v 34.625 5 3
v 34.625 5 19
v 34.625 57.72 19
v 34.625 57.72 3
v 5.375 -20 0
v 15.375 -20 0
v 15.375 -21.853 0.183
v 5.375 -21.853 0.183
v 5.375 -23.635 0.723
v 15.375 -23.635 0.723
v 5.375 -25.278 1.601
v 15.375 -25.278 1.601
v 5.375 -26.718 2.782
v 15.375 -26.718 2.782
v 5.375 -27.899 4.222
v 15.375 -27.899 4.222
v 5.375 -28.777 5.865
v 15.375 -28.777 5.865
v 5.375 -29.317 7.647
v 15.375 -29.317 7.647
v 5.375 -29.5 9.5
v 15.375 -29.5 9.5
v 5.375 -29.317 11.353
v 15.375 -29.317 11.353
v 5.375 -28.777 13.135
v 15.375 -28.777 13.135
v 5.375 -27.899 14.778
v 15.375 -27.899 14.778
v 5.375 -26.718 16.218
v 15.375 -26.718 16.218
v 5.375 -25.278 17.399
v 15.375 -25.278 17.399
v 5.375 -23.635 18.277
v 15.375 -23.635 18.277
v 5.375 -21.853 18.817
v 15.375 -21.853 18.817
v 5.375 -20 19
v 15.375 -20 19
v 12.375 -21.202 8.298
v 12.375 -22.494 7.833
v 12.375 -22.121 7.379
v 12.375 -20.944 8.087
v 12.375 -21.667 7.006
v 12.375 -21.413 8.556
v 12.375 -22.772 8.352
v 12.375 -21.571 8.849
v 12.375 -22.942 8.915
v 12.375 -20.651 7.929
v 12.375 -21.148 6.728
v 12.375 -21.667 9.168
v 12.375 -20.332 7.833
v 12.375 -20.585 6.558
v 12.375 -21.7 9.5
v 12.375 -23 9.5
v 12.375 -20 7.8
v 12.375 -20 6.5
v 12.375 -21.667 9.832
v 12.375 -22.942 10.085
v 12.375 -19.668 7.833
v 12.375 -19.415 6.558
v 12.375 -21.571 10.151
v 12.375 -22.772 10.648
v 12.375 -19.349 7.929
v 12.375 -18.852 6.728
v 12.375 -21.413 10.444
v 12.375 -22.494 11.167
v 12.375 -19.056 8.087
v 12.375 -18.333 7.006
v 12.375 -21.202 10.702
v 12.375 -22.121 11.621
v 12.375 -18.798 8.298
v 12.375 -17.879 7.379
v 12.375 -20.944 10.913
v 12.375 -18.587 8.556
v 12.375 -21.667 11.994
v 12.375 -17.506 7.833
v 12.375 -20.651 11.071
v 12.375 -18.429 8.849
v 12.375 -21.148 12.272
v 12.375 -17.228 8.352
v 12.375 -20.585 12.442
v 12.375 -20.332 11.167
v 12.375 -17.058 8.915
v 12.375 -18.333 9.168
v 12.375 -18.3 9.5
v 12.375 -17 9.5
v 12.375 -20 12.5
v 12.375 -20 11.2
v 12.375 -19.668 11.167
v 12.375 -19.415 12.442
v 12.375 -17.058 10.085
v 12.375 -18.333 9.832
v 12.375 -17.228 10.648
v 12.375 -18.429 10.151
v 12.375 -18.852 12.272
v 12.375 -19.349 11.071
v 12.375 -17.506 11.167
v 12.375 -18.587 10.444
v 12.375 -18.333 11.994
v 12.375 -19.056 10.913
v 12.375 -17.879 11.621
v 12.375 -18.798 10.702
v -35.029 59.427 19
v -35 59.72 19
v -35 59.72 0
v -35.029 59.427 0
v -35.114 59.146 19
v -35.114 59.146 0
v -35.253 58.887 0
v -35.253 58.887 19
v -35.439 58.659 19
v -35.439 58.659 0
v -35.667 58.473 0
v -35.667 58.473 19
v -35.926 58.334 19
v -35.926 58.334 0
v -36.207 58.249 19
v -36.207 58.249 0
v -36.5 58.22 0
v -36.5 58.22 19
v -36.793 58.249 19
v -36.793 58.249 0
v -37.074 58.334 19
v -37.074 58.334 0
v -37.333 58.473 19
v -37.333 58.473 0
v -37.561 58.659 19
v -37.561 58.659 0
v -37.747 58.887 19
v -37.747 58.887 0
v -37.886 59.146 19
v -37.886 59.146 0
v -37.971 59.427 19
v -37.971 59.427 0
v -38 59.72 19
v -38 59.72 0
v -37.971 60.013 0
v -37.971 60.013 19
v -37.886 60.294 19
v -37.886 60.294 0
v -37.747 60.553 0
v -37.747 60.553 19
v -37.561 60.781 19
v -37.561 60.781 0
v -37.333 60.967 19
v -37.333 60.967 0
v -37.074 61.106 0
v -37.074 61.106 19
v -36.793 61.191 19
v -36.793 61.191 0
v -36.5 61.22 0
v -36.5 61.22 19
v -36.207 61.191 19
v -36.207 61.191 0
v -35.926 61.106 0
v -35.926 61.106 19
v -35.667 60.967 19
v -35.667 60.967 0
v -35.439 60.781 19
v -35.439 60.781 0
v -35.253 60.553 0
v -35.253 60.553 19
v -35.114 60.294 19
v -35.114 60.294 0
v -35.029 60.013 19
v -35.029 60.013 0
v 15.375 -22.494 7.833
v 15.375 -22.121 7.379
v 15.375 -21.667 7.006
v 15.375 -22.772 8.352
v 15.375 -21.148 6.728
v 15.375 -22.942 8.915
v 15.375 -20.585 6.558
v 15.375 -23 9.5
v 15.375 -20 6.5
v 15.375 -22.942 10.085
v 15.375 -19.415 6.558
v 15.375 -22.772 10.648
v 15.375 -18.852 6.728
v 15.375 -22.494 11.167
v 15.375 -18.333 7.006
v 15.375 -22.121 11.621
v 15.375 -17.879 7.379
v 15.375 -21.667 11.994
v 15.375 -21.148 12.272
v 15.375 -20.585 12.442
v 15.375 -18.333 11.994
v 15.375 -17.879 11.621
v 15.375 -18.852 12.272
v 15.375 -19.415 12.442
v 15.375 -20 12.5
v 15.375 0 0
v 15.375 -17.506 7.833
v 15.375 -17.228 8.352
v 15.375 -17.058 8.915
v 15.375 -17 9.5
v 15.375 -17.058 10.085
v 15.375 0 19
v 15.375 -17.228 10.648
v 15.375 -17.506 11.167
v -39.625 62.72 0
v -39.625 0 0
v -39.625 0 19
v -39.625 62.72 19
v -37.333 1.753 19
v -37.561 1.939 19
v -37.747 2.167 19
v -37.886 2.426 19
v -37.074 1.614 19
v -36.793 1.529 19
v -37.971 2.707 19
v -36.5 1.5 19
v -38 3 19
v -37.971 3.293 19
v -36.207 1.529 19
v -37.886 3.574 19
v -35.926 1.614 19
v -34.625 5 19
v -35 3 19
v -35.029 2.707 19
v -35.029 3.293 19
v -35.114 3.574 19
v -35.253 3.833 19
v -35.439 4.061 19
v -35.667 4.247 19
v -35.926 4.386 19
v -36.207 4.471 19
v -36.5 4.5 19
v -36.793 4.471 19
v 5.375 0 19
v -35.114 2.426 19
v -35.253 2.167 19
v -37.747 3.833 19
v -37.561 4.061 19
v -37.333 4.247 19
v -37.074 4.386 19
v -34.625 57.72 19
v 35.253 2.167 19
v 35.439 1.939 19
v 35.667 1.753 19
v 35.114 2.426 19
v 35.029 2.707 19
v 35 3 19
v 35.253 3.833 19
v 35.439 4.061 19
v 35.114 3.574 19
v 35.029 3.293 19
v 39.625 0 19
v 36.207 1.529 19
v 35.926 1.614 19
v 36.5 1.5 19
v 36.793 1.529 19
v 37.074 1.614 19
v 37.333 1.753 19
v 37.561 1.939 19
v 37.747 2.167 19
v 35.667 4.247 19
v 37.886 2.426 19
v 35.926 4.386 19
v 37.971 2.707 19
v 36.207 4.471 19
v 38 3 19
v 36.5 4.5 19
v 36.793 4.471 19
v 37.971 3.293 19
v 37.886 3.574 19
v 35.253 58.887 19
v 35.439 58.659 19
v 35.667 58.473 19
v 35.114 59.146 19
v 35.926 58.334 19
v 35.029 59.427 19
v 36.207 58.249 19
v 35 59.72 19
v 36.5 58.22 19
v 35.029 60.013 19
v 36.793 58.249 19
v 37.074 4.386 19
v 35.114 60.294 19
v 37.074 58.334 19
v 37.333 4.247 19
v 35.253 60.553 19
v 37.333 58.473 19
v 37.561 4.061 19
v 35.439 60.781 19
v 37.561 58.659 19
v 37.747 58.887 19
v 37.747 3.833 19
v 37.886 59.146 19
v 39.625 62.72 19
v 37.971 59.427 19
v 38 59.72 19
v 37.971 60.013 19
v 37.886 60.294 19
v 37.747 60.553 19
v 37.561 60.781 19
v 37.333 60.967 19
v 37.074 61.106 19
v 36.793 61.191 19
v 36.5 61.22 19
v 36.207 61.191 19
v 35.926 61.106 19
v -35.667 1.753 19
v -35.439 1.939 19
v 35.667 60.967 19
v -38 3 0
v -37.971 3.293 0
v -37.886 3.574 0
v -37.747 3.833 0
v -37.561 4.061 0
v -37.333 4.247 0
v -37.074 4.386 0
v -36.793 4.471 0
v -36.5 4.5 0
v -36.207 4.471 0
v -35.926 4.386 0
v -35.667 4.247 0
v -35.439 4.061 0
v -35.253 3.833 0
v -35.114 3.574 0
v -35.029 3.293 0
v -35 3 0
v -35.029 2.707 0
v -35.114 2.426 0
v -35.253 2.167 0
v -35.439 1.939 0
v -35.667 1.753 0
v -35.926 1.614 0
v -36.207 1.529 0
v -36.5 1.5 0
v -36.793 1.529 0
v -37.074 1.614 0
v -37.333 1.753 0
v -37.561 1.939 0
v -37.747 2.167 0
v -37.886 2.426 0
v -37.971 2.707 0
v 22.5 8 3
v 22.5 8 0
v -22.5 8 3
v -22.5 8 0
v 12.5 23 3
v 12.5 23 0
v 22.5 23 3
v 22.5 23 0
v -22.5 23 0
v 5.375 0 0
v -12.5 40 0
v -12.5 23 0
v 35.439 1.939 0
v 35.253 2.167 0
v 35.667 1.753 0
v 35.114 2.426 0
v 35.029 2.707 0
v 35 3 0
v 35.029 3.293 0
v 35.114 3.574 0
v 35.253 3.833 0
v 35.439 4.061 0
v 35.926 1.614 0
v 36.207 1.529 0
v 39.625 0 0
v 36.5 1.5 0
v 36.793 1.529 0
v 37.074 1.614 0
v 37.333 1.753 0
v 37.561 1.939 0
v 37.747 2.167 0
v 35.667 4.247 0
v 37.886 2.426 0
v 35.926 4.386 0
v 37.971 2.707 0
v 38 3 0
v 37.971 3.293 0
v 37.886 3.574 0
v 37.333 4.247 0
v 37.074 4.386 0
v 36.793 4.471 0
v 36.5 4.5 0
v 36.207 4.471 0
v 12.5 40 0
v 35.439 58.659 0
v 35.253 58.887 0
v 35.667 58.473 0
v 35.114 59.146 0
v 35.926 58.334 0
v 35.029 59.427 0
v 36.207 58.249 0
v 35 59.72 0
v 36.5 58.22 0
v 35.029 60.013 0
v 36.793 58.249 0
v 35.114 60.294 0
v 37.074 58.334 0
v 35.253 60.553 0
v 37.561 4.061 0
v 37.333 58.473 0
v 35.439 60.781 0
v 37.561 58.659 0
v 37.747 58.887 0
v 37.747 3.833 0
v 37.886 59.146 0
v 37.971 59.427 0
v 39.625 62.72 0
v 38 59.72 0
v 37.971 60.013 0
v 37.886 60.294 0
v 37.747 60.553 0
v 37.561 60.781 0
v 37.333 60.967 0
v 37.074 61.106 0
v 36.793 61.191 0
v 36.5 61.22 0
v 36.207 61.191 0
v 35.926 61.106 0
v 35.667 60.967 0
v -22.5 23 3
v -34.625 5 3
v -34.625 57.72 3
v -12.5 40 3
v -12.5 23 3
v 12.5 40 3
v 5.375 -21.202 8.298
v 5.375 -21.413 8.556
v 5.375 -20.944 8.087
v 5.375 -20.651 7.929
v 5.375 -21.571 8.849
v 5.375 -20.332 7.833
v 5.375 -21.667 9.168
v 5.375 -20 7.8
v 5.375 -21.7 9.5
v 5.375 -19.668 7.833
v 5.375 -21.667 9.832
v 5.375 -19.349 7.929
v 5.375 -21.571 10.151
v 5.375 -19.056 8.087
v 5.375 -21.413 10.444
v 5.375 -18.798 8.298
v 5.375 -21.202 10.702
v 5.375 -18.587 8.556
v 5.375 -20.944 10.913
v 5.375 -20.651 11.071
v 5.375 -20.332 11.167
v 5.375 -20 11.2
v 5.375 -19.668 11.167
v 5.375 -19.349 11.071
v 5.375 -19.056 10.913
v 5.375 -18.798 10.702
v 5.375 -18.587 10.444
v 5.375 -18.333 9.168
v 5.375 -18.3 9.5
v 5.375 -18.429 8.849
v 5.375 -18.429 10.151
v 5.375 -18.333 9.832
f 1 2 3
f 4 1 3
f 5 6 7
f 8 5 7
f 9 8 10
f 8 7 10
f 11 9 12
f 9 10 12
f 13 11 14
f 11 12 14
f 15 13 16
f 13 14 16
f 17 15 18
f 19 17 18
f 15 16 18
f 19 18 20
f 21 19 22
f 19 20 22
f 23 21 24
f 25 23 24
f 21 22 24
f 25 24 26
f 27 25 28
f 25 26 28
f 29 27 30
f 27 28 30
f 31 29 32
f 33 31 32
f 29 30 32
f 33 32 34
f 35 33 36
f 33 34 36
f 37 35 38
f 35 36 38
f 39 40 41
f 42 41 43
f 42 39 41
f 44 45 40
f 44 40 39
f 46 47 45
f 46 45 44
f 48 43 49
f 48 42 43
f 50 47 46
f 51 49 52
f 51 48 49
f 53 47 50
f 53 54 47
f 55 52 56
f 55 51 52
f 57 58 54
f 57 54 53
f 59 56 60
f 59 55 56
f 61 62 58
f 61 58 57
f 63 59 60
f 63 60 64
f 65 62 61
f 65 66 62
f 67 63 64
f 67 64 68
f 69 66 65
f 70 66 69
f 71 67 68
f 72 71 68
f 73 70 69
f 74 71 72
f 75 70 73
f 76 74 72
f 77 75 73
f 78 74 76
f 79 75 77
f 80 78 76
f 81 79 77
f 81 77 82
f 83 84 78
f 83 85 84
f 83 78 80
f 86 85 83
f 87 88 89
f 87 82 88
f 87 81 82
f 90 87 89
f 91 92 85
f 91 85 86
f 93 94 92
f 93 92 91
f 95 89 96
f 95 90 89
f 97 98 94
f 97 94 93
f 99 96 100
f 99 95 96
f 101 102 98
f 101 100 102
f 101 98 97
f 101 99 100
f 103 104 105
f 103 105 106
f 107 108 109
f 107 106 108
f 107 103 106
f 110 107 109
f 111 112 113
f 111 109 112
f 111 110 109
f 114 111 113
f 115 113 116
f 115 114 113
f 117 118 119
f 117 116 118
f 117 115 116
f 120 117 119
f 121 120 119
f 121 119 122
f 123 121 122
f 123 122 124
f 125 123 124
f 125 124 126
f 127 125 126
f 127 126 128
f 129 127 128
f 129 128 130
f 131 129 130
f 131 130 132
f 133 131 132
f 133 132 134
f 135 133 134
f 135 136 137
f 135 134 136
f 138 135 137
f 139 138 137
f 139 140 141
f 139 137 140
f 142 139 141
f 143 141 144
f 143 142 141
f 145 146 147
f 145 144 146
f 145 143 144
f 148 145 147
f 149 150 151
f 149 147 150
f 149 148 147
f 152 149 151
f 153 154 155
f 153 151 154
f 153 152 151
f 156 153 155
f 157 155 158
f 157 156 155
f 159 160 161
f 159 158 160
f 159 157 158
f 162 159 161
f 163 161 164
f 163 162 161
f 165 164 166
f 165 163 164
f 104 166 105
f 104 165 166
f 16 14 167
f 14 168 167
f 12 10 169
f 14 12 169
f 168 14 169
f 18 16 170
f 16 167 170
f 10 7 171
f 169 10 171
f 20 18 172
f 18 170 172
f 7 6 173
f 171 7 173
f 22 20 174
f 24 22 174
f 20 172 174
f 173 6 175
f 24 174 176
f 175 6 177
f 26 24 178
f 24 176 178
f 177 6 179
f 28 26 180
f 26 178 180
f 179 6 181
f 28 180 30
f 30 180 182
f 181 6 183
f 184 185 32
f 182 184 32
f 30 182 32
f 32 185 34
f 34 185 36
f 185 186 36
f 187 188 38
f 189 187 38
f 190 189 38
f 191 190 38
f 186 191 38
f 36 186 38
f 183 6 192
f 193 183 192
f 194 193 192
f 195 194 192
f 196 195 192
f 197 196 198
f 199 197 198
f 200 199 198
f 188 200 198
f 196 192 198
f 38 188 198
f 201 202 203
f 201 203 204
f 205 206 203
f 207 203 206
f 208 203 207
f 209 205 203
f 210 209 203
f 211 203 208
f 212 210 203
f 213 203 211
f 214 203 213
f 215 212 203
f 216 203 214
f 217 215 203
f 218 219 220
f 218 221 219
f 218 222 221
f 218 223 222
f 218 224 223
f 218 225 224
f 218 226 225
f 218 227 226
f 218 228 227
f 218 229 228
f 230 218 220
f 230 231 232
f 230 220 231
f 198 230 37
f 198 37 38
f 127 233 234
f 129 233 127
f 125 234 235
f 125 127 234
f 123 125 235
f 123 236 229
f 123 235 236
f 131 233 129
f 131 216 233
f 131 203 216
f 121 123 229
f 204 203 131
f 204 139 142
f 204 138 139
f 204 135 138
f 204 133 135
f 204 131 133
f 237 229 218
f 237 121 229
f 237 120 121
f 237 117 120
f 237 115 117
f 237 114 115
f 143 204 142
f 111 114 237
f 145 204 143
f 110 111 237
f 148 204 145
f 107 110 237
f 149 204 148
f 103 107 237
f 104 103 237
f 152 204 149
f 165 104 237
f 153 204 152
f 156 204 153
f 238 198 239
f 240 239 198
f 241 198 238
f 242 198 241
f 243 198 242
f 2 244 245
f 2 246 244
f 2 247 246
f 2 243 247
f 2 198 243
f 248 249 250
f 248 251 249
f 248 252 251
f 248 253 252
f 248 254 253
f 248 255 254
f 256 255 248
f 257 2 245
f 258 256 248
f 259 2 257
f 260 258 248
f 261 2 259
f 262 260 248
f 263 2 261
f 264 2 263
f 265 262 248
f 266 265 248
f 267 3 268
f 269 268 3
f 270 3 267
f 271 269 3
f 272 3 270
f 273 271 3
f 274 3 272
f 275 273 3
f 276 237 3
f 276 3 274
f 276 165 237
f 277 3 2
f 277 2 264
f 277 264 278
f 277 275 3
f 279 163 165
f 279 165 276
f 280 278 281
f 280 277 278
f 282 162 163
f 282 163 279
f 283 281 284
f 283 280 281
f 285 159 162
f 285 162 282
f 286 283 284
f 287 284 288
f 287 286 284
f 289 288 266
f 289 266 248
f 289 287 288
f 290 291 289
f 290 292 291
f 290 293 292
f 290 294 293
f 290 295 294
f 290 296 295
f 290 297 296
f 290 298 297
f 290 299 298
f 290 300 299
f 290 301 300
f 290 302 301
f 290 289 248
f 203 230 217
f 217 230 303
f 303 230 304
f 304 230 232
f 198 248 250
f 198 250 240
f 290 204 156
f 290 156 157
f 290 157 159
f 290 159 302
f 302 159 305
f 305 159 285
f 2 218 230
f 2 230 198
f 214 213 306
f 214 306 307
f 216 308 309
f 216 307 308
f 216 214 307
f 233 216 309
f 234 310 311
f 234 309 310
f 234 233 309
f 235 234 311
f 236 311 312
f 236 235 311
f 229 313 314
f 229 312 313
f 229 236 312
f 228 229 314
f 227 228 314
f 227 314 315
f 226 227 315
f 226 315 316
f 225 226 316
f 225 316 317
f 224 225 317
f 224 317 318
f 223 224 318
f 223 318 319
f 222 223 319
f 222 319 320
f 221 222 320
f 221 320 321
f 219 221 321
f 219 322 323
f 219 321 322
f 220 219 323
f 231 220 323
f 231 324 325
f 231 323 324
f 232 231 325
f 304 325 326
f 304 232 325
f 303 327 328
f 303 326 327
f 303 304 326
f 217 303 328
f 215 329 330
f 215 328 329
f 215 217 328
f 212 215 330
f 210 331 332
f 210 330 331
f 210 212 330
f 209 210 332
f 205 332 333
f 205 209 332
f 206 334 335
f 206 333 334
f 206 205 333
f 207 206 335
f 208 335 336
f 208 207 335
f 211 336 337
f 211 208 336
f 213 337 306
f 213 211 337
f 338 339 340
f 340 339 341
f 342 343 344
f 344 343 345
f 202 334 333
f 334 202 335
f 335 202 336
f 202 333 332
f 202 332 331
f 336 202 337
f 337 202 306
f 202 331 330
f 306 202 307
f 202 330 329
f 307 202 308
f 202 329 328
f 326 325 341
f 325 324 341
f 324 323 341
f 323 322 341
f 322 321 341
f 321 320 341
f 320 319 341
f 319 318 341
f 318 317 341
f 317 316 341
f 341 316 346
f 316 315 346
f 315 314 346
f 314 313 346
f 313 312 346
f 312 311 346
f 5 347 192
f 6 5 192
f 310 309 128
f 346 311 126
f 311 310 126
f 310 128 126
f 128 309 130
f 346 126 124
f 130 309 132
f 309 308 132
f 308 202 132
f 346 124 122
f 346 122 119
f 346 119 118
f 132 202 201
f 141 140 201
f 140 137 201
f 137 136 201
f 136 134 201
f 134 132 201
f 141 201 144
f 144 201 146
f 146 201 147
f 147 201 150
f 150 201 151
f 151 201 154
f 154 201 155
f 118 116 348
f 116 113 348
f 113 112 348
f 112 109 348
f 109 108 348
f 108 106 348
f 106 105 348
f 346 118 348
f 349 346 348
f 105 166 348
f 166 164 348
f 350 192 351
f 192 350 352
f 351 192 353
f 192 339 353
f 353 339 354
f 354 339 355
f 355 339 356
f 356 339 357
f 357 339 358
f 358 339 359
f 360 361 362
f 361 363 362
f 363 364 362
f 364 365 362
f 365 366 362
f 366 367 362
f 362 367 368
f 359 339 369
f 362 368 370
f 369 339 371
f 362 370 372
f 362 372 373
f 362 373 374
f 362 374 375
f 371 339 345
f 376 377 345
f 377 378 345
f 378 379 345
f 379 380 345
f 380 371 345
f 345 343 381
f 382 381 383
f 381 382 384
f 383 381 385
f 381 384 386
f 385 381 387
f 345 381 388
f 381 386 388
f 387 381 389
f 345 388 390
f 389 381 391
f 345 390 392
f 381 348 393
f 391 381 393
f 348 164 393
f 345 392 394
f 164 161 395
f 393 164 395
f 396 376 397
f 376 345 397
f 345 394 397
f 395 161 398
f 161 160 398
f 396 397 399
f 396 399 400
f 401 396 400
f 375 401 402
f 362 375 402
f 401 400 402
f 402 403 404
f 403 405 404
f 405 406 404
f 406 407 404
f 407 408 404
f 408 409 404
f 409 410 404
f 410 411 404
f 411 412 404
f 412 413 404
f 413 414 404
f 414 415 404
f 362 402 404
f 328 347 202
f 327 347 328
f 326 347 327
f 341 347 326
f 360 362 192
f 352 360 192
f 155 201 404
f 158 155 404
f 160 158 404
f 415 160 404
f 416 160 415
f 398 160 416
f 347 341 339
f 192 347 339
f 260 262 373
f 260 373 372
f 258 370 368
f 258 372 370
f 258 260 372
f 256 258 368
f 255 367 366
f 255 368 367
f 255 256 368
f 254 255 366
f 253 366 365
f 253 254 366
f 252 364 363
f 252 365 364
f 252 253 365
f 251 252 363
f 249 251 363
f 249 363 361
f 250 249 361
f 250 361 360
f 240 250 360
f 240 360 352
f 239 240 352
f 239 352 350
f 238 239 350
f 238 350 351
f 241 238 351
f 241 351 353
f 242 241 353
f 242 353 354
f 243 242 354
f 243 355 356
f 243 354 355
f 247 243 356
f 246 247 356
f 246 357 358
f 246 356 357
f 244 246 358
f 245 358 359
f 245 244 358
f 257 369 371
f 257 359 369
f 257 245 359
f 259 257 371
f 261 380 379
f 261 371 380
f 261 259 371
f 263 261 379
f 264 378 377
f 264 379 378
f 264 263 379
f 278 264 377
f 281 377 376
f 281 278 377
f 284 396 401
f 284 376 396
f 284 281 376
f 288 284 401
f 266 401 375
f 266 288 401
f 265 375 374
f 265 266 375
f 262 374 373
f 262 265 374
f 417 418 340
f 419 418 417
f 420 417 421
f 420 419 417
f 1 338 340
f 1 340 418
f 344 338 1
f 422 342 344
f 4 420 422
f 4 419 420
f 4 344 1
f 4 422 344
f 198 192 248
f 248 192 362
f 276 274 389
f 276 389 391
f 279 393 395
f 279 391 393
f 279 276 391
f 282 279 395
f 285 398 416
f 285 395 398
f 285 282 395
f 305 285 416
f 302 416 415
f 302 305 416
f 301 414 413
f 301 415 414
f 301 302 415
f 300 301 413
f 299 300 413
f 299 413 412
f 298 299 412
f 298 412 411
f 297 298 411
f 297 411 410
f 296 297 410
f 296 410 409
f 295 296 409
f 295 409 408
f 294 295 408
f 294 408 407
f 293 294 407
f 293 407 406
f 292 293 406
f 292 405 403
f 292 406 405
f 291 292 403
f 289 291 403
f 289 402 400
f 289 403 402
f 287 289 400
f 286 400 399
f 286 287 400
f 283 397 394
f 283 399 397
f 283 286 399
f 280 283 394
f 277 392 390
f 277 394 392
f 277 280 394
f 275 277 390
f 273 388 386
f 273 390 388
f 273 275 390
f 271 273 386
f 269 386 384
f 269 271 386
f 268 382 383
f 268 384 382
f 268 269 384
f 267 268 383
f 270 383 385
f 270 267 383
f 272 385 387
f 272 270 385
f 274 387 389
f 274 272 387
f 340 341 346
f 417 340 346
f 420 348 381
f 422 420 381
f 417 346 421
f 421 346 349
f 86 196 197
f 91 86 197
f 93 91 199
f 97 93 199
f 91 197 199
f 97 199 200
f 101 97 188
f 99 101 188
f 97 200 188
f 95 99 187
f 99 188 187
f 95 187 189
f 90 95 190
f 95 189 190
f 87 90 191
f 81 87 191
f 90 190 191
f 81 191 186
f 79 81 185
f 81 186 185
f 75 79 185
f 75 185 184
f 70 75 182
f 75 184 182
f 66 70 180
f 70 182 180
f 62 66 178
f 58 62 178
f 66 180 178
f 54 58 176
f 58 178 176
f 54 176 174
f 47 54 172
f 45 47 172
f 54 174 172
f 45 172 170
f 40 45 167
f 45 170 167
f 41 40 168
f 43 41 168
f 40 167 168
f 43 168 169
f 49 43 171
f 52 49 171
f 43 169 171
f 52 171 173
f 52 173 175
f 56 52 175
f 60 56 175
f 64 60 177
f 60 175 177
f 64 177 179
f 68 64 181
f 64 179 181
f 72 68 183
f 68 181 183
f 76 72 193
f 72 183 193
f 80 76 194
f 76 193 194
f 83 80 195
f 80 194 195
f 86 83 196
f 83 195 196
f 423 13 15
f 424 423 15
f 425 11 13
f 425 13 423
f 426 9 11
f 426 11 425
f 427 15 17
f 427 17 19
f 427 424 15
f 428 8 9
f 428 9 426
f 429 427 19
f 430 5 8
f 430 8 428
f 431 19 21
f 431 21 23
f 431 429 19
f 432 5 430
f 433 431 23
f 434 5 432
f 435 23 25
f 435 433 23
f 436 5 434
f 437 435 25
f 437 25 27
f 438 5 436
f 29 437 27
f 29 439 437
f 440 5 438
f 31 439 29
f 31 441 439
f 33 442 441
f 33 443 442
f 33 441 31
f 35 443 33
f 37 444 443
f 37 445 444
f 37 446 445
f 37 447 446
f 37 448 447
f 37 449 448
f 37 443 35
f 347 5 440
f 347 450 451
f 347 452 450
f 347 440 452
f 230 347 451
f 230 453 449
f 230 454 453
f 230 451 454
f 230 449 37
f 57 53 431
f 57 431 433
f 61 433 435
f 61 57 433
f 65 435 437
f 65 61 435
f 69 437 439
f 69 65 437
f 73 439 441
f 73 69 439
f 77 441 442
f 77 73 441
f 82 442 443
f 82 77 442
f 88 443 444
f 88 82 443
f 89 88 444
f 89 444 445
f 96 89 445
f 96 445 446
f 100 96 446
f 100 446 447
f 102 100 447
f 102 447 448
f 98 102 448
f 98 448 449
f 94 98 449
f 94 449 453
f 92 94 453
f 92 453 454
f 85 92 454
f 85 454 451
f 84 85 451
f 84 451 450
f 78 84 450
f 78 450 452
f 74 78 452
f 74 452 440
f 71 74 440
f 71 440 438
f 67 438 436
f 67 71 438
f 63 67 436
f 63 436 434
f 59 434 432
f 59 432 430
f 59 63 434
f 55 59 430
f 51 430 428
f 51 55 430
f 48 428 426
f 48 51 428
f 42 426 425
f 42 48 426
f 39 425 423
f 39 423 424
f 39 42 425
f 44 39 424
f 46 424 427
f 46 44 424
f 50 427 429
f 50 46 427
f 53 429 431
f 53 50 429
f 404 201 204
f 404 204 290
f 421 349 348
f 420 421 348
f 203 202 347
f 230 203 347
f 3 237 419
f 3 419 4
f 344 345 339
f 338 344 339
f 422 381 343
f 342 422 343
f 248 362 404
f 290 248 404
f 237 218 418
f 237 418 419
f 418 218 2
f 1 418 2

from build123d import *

# Parameters (mm, degrees)
SKETCH_1_W               = 79.25
SKETCH_1_H               = 62.72
EXTRUDE_1_DEPTH          = 19
SKETCH_2_W               = 69.25
SKETCH_2_H               = 52.72
CUT_EXTRUDE_1_DEPTH      = 16
CUT_EXTRUDE_2_DEPTH      = 10
CUT_EXTRUDE_3_DEPTH      = 77.582889897
CUT_EXTRUDE_3_DEPTH_BACK = 77.582889897
SKETCH_4_R               = 1.5
EXTRUDE_START            = -55
SKETCH_5_R               = 1.7
EXTRUDE_2_DEPTH          = 10
SKETCH_6_R               = 3
CUT_EXTRUDE_4_DEPTH      = 3


with BuildPart() as part:
    # 草图1 → 凸台-拉伸1 (new body)
    with BuildSketch(Plane.XY):
        with Locations((0, 31.36)):
            Rectangle(SKETCH_1_W, SKETCH_1_H)
    extrude(amount=EXTRUDE_1_DEPTH)

    # 草图2 → 切除-拉伸1 (cut)
    with BuildSketch(Plane.XY.offset(19)):
        with Locations((0, 31.36)):
            Rectangle(SKETCH_2_W, SKETCH_2_H)
    extrude(amount=-CUT_EXTRUDE_1_DEPTH, mode=Mode.SUBTRACT)

    # 草图3 → 切除-拉伸2 (cut)
    with BuildSketch(Plane(origin=(0, 0, 0), x_dir=(-1, 0, 0), z_dir=(0, 0, -1))):
        Polygon((12.5, 40), (-12.5, 40), (-12.5, 23), (-22.5, 23), (-22.5, 8), (22.5, 8), (22.5, 23), (12.5, 23), align=None)
    extrude(amount=-CUT_EXTRUDE_2_DEPTH, mode=Mode.SUBTRACT)

    # 草图4 → 切除-拉伸3 (cut, two sides: drawn at the far end of the back side and taken through both)
    with BuildSketch(Plane(origin=(0, 0, 0), x_dir=(-1, 0, 0), z_dir=(0, 0, -1)).offset(-CUT_EXTRUDE_3_DEPTH_BACK)):
        with Locations((-36.5, 59.72)):
            Circle(SKETCH_4_R)
        with Locations(Location((36.5, 59.72, 0), (0, 0, 180))):
            Circle(SKETCH_4_R)
        with Locations(Location((-36.5, 3, 0), (0, 0, 180))):
            Circle(SKETCH_4_R)
        with Locations((36.5, 3)):
            Circle(SKETCH_4_R)
    extrude(amount=CUT_EXTRUDE_3_DEPTH + CUT_EXTRUDE_3_DEPTH_BACK, mode=Mode.SUBTRACT)

    # 草图5 → 凸台-拉伸2 (add)
    with BuildSketch(Plane.ZY.offset(39.625).offset(EXTRUDE_START)):
        with BuildLine():
            Line((0, 0), (0, -20))
            ThreePointArc((0, -20), (9.5, -29.5), (19, -20))
            Line((19, -20), (19, 0))
            Line((19, 0), (0, 0))
        make_face()
        with Locations(Location((9.5, -20, 0), (0, 0, 270))):
            Circle(SKETCH_5_R, mode=Mode.SUBTRACT)
    extrude(amount=EXTRUDE_2_DEPTH)

    # 草图6 → 切除-拉伸4 (cut)
    with BuildSketch(Plane(origin=(15.375, 0, 0), x_dir=(0, 0, -1), z_dir=(1, 0, 0))):
        with Locations(Location((-9.5, -20, 0), (0, 0, 90))):
            Circle(SKETCH_6_R)
    extrude(amount=-CUT_EXTRUDE_4_DEPTH, mode=Mode.SUBTRACT)


solid = part.part
